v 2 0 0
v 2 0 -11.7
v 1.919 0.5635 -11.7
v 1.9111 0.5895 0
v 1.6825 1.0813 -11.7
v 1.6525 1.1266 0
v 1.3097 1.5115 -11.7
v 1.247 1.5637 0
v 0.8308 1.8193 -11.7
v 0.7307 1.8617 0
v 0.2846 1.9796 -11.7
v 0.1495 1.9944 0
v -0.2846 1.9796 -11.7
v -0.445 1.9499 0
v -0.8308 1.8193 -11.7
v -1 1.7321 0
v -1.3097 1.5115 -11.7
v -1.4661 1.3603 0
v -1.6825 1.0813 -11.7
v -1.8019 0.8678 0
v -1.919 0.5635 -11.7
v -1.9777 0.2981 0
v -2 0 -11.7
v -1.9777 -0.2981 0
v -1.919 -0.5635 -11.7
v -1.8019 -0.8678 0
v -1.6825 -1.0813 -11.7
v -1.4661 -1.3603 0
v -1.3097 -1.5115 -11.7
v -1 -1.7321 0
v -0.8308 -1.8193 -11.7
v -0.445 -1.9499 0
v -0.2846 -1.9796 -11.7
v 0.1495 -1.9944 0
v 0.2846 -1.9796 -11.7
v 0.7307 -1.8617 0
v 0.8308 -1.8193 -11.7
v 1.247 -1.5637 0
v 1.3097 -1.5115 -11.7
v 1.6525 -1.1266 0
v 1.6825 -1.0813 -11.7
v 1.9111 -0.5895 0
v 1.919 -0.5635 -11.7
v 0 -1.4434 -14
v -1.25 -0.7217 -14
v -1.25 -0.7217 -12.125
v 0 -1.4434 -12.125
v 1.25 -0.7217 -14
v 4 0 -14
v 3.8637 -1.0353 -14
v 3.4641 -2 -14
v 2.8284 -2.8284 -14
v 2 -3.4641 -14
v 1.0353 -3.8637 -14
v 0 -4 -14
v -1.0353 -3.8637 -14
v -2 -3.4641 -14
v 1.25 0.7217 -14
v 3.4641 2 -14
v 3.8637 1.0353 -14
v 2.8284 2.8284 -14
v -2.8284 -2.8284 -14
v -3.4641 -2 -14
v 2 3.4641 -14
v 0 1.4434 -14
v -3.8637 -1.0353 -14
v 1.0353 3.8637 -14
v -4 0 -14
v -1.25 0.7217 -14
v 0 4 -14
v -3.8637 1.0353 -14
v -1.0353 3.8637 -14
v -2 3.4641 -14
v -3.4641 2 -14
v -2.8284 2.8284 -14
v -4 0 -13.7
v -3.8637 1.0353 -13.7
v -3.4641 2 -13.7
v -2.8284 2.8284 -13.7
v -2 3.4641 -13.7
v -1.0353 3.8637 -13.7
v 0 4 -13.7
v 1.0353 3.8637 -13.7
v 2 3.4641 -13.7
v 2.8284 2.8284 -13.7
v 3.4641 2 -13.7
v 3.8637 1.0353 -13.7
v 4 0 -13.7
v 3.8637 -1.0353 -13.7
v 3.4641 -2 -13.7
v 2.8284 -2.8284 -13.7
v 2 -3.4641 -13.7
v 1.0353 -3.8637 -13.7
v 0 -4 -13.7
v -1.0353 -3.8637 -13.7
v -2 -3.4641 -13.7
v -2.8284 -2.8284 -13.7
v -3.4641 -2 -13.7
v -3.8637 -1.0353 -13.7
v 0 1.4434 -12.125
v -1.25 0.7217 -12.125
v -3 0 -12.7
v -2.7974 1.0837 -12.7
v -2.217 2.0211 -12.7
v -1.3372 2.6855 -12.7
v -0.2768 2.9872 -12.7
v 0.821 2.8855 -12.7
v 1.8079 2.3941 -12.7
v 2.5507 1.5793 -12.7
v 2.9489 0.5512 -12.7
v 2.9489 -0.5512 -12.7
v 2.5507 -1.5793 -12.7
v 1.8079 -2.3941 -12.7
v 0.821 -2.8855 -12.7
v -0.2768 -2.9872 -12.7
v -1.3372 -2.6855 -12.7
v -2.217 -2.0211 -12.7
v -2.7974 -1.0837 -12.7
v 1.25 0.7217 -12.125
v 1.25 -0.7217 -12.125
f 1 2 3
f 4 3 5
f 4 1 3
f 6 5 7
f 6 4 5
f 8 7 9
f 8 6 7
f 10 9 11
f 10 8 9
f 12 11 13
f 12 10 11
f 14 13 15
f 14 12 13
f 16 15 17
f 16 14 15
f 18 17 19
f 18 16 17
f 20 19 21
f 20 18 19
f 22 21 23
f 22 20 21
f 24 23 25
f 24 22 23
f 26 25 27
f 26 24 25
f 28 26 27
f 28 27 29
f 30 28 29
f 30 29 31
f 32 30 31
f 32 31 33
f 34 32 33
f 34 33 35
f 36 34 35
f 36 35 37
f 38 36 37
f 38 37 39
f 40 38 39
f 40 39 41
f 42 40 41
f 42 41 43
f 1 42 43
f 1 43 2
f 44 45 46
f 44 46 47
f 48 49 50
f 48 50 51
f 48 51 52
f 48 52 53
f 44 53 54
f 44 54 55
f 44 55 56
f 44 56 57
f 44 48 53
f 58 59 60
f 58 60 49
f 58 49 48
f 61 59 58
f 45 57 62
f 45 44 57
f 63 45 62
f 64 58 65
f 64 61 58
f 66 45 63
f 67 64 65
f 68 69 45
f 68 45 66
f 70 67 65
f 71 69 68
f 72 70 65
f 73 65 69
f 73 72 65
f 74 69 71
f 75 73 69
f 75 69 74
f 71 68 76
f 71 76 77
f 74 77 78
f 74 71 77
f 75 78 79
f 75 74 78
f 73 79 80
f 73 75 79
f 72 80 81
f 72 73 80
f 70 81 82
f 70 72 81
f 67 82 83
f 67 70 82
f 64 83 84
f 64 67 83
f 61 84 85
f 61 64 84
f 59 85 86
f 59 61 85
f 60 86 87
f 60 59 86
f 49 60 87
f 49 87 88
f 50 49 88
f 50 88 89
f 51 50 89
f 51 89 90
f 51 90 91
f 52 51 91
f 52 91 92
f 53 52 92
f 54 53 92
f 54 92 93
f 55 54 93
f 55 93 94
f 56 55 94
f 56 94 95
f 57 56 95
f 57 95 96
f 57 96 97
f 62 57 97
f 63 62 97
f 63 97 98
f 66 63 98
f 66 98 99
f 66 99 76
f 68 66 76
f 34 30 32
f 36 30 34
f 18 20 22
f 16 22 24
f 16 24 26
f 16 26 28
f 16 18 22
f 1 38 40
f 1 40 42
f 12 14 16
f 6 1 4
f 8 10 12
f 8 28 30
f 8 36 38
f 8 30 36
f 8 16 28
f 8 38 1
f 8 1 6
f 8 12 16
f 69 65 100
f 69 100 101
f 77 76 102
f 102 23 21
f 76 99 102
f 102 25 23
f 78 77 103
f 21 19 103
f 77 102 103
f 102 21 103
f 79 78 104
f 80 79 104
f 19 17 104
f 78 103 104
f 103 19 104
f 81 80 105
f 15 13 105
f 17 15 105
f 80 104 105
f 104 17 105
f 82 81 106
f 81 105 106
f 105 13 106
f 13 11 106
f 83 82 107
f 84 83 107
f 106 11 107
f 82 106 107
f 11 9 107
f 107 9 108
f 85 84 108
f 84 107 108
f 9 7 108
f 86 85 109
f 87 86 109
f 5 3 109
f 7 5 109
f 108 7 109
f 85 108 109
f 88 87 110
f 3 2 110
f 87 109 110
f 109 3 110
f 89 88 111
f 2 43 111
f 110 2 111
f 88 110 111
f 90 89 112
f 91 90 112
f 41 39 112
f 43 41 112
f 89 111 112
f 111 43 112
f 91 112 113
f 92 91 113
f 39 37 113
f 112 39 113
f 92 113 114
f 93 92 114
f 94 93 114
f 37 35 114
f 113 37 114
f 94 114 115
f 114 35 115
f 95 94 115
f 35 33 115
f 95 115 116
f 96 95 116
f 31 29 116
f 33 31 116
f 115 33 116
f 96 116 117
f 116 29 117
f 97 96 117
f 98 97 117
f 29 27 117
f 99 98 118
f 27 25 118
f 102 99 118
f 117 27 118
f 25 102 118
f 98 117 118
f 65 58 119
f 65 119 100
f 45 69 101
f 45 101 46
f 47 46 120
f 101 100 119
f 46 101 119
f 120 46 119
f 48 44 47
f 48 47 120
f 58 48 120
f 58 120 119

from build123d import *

# Parameters (mm, degrees)
SKETCH1_R          = 2
EXTRUDE1_DEPTH     = 14
SKETCH6_R          = 4
EXTRUDE2_DEPTH     = 2.3
CUT_EXTRUDE1_DEPTH = 1.875


with BuildPart() as part:
    # Sketch1 → Extrude1 (new body)
    with BuildSketch(Plane.XY):
        Circle(SKETCH1_R)
    extrude(amount=-EXTRUDE1_DEPTH)

    # Sketch6 → Extrude2 (add)
    with BuildSketch(Plane(origin=(0, 0, -14), x_dir=(-1, 0, 0), z_dir=(0, 0, -1))):
        Circle(SKETCH6_R)
    extrude(amount=-EXTRUDE2_DEPTH)

    # Sketch10 → Cut-Revolve2 (revolve, cut)
    with BuildSketch(Plane(origin=(0, 0, 0), x_dir=(0, 0, -1), z_dir=(1, 0, 0)), mode=Mode.PRIVATE) as cut_revolve2_sk:
        Polygon((13.7, -4), (11.7, -2), (11.7, -4), align=None)
    revolve(cut_revolve2_sk.sketch.rotate(Axis((0, 0, 0), (0, 0, -1)), 90), axis=Axis((0, 0, 0), (0, 0, -1)), mode=Mode.SUBTRACT)

    # Sketch7 → Cut-Extrude1 (cut)
    with BuildSketch(Plane.XY.offset(-14)):
        Polygon((0, 1.443375673), (-1.25, 0.721687836), (-1.25, -0.721687836), (0, -1.443375673), (1.25, -0.721687836), (1.25, 0.721687836), align=None)
    extrude(amount=CUT_EXTRUDE1_DEPTH, mode=Mode.SUBTRACT)


solid = part.part
